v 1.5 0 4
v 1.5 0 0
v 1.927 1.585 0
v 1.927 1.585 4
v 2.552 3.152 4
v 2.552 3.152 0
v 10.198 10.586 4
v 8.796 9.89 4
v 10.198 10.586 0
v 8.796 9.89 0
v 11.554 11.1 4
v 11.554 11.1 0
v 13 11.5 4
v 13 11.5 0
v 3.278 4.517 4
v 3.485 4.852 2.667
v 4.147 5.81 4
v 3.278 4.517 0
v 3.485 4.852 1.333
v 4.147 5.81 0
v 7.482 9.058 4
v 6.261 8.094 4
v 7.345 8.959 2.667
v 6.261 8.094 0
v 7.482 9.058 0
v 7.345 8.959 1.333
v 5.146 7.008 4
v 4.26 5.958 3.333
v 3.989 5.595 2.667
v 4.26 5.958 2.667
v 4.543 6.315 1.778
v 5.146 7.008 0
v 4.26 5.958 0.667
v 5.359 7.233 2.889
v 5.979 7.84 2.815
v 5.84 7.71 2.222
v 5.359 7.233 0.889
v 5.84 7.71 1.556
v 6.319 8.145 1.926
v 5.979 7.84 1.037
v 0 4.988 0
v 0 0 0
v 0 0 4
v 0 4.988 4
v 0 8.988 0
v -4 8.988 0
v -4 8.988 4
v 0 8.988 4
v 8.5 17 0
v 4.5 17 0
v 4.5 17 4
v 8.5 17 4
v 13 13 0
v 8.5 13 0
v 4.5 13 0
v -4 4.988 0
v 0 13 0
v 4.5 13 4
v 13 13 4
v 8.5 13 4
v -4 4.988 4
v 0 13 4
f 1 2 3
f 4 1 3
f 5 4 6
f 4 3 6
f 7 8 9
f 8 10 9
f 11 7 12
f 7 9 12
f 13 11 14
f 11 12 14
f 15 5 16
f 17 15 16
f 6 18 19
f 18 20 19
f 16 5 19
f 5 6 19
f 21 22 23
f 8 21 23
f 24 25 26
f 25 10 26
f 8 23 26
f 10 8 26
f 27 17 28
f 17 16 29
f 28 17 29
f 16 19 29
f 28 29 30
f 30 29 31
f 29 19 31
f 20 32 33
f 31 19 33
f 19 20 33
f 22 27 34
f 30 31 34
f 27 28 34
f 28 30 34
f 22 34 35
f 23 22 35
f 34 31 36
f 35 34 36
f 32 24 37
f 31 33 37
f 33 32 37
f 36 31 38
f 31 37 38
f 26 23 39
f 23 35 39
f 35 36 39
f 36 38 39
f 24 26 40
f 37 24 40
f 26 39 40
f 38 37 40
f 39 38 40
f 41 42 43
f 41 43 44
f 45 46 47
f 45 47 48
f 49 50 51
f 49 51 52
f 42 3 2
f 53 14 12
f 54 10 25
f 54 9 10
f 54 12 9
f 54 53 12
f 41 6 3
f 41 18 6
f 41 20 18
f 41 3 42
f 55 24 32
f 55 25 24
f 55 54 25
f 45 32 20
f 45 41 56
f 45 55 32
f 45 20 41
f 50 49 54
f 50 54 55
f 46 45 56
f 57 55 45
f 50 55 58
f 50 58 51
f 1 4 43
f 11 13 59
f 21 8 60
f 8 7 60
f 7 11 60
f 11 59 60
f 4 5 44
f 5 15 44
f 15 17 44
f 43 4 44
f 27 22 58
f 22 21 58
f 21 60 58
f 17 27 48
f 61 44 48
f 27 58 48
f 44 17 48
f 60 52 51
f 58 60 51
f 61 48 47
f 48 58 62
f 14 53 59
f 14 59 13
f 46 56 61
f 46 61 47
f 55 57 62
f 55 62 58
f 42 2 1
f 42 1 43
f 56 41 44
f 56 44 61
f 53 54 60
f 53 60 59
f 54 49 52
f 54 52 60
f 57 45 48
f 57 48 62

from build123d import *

# Parameters (mm, degrees)
BOSS_EXTRUDE1_DEPTH = 4


with BuildPart() as part:
    # Sketch1 → Boss-Extrude1 (new body)
    with BuildSketch(Plane.XY):
        with BuildLine():
            Line((0, 13), (4.5, 13))
            Line((4.5, 13), (4.5, 17))
            Line((4.5, 17), (8.5, 17))
            Line((8.5, 17), (8.5, 13))
            Line((8.5, 13), (13, 13))
            Line((13, 13), (13, 11.5))
            add(Edge.make_bspline(
                [(1.5, 0), (2.52035849, 4.950366231), (6.473986228, 10.017019138), (13, 11.5)],
                knots=[0, 0, 0, 0, 1, 1, 1, 1], degree=3))
            Line((1.5, 0), (0, 0))
            Line((0, 0), (0, 4.987852908))
            Line((0, 4.987852908), (-4, 4.987852908))
            Line((-4, 4.987852908), (-4, 8.987852908))
            Line((-4, 8.987852908), (0, 8.987852908))
            Line((0, 8.987852908), (0, 13))
        make_face()
    extrude(amount=BOSS_EXTRUDE1_DEPTH)


solid = part.part
